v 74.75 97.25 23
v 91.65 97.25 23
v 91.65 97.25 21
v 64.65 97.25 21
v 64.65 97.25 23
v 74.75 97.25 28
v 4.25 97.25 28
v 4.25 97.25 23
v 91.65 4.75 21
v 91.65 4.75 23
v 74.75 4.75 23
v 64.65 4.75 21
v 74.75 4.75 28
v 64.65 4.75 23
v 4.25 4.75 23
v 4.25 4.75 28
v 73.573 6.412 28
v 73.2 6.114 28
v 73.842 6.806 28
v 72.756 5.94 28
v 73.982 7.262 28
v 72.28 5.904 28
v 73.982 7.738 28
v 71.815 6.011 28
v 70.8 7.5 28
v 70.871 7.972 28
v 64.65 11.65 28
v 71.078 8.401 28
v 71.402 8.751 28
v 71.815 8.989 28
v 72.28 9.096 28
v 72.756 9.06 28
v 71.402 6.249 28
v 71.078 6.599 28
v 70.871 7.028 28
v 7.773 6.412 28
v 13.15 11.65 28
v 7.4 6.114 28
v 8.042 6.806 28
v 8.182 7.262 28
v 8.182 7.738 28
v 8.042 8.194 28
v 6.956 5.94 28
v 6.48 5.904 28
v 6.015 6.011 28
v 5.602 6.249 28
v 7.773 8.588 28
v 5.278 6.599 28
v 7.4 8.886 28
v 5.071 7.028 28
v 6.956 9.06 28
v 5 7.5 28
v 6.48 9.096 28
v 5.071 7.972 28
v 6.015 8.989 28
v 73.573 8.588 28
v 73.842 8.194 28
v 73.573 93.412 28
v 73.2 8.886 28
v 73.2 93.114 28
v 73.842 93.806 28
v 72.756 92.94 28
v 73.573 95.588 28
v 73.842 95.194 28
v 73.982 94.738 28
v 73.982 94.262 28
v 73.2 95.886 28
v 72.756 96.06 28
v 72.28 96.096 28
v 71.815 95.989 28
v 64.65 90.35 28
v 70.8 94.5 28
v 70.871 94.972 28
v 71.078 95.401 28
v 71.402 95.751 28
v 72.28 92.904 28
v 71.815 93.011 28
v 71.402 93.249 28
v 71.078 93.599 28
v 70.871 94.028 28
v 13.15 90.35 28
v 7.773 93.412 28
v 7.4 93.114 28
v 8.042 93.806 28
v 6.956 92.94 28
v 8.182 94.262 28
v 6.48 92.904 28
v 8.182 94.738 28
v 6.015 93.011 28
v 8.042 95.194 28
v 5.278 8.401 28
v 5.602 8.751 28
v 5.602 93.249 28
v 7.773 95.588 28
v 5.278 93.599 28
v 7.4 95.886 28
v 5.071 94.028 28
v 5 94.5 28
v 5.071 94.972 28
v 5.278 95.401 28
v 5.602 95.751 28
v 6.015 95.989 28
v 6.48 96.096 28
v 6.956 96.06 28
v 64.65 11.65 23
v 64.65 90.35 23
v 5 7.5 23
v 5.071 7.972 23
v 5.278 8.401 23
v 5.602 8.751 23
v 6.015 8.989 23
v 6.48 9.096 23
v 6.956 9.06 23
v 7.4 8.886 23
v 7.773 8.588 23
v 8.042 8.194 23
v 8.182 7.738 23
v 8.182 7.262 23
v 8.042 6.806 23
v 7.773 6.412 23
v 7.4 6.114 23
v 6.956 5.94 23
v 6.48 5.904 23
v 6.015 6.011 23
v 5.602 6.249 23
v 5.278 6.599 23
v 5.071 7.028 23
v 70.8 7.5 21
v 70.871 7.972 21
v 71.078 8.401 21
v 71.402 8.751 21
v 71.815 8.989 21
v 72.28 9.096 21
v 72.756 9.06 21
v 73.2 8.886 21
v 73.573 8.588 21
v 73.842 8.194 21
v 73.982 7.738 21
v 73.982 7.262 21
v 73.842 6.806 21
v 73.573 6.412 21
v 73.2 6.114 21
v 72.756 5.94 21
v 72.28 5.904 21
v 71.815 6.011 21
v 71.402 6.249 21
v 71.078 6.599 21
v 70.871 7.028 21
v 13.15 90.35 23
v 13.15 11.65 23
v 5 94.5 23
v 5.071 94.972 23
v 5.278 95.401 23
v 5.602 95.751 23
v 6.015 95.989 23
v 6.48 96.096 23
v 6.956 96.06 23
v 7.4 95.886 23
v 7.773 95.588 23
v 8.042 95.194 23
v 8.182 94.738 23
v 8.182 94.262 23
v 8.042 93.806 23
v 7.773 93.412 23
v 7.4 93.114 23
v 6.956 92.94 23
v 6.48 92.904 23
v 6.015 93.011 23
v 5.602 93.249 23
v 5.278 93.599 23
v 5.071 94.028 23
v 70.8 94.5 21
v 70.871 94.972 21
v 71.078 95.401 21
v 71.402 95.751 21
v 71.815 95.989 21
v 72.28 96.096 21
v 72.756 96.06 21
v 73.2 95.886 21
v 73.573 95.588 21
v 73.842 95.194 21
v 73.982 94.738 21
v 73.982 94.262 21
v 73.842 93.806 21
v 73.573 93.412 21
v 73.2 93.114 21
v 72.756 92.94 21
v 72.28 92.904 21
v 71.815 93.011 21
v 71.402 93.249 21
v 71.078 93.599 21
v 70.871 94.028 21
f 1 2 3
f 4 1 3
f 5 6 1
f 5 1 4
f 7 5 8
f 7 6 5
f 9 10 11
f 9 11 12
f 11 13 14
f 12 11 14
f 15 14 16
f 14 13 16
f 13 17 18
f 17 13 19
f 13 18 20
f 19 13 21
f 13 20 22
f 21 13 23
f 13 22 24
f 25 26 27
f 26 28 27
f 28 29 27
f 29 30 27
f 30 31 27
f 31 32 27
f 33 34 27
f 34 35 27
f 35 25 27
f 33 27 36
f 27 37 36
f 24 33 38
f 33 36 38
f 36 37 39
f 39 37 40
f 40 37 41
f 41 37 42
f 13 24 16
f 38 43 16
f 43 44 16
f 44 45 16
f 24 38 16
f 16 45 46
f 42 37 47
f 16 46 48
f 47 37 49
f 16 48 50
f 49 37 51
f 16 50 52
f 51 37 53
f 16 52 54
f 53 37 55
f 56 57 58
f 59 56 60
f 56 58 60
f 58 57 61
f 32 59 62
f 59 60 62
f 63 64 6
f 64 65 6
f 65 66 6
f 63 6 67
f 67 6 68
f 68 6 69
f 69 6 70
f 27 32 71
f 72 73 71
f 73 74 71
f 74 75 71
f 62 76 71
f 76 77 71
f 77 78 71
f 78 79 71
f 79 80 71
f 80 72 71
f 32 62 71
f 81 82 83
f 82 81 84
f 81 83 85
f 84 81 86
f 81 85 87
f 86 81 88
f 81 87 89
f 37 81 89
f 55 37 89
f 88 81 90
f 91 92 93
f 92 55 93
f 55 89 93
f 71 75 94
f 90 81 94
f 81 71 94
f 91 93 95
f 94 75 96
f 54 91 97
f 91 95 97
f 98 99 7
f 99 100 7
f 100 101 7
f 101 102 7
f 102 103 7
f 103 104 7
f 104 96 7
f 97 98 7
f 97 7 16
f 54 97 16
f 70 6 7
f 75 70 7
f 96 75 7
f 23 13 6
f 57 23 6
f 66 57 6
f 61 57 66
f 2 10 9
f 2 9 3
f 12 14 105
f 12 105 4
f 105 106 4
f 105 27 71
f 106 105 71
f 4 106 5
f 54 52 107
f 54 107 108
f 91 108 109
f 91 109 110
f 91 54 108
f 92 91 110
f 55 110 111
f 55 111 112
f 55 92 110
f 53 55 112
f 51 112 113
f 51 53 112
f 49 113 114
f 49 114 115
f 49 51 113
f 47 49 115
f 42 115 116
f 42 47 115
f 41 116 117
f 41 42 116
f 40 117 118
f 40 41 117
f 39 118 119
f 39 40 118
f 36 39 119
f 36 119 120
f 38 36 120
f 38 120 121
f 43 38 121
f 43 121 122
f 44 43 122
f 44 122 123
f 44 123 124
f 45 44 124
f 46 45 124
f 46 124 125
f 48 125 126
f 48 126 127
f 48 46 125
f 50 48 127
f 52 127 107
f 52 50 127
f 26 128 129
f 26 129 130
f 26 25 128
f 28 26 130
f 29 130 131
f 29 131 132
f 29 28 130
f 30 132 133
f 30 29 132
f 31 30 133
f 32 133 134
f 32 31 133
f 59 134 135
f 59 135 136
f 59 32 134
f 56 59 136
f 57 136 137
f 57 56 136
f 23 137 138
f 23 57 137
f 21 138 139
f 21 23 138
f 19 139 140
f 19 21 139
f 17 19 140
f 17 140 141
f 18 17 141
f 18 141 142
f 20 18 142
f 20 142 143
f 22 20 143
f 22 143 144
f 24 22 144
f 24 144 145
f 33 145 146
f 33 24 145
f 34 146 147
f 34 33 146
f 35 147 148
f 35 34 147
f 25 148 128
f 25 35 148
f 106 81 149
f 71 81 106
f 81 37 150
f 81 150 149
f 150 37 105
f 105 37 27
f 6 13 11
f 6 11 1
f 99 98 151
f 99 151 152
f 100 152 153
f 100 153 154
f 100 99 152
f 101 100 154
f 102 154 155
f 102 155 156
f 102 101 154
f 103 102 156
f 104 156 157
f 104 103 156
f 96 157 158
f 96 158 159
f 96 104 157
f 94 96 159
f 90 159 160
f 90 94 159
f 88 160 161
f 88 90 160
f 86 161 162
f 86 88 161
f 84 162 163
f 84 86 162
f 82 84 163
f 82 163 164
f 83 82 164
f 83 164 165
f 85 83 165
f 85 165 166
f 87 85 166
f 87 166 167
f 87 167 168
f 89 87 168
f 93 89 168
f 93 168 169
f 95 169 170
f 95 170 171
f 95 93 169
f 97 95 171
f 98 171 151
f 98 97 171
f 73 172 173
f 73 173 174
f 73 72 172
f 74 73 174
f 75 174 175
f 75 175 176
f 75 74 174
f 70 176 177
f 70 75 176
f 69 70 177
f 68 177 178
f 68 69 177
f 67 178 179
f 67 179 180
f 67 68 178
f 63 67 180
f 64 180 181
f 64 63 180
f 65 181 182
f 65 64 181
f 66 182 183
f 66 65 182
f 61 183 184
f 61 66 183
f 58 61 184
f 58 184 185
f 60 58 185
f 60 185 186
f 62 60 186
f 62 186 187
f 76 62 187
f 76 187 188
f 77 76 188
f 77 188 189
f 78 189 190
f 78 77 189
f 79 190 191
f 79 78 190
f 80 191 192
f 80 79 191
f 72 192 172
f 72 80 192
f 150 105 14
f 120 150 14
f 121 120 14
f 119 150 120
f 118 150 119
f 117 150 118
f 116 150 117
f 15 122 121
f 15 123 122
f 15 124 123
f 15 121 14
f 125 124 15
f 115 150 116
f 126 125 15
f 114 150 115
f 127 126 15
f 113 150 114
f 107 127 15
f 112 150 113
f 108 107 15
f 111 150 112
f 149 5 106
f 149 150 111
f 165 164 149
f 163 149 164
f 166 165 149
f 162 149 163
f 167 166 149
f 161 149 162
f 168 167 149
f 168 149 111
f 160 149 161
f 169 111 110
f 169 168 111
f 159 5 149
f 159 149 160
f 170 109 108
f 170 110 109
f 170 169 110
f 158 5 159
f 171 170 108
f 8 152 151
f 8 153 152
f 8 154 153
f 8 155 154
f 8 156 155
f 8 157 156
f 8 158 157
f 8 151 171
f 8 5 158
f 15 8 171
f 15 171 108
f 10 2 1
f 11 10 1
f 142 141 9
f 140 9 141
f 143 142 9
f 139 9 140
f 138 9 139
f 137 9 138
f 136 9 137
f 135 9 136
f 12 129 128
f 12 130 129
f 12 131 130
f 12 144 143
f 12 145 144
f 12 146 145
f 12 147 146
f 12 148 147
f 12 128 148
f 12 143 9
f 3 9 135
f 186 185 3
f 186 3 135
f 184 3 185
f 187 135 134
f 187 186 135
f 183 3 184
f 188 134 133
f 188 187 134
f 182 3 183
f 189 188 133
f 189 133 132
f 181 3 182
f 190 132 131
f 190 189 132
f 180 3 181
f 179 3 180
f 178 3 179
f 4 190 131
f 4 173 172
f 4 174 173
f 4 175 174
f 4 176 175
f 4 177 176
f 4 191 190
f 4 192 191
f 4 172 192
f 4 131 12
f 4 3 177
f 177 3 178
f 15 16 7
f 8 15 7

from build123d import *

# Parameters (mm, degrees)
SKETCH_1_W          = 71
SKETCH_1_H          = 93
SKETCH_1_R          = 1.6
SKETCH_1_W_2        = 51
SKETCH_1_H_2        = 78.2
EXTRUDE_1_DEPTH     = 5
SKETCH_2_W          = 71
SKETCH_2_H          = 93
SKETCH_2_W_2        = 70.5
SKETCH_2_H_2        = 92.5
CUT_EXTRUDE_1_DEPTH = 6
SKETCH_3_W          = 51.5
SKETCH_3_H          = 78.7
SKETCH_3_W_2        = 51
SKETCH_3_H_2        = 78.2
CUT_EXTRUDE_2_DEPTH = 6
SKETCH_5_W          = 27
SKETCH_5_H          = 92.5
SKETCH_5_R          = 1.6
EXTRUDE_3_DEPTH     = 2


with BuildPart() as part:
    # Эскиз1 → Бобышка-Вытянуть1 (new body)
    with BuildSketch(Plane(origin=(0, 0, 28), x_dir=(-1, 0, 0), z_dir=(0, 0, -1))):
        with Locations((-39.5, 51)):
            Rectangle(SKETCH_1_W, SKETCH_1_H)
        with Locations((-6.6, 7.5)):
            Circle(SKETCH_1_R, mode=Mode.SUBTRACT)
        with Locations((-72.4, 7.5)):
            Circle(SKETCH_1_R, mode=Mode.SUBTRACT)
        with Locations((-6.6, 94.5)):
            Circle(SKETCH_1_R, mode=Mode.SUBTRACT)
        with Locations((-72.4, 94.5)):
            Circle(SKETCH_1_R, mode=Mode.SUBTRACT)
        with Locations((-38.9, 51)):
            Rectangle(SKETCH_1_W_2, SKETCH_1_H_2, mode=Mode.SUBTRACT)
    extrude(amount=EXTRUDE_1_DEPTH)

    # Эскиз2 → Вырез-Вытянуть1 (cut, through all)
    with BuildSketch(Plane.XY.offset(28)):
        with Locations((39.5, 51)):
            Rectangle(SKETCH_2_W, SKETCH_2_H)
        with Locations((39.5, 51)):
            Rectangle(SKETCH_2_W_2, SKETCH_2_H_2, mode=Mode.SUBTRACT)
    extrude(amount=-CUT_EXTRUDE_1_DEPTH, mode=Mode.SUBTRACT)

    # Эскиз3 → Вырез-Вытянуть2 (cut, through all)
    with BuildSketch(Plane.XY.offset(28)):
        with Locations((38.9, 51)):
            Rectangle(SKETCH_3_W, SKETCH_3_H)
        with Locations((38.9, 51)):
            Rectangle(SKETCH_3_W_2, SKETCH_3_H_2, mode=Mode.SUBTRACT)
    extrude(amount=-CUT_EXTRUDE_2_DEPTH, mode=Mode.SUBTRACT)

    # Эскиз5 → Бобышка-Вытянуть3 (add)
    with BuildSketch(Plane(origin=(0, 0, 23), x_dir=(-1, 0, 0), z_dir=(0, 0, -1))):
        with Locations((-78.15, 51)):
            Rectangle(SKETCH_5_W, SKETCH_5_H)
        with Locations((-72.4, 94.5)):
            Circle(SKETCH_5_R, mode=Mode.SUBTRACT)
        with Locations((-72.4, 7.5)):
            Circle(SKETCH_5_R, mode=Mode.SUBTRACT)
    extrude(amount=EXTRUDE_3_DEPTH)


solid = part.part
